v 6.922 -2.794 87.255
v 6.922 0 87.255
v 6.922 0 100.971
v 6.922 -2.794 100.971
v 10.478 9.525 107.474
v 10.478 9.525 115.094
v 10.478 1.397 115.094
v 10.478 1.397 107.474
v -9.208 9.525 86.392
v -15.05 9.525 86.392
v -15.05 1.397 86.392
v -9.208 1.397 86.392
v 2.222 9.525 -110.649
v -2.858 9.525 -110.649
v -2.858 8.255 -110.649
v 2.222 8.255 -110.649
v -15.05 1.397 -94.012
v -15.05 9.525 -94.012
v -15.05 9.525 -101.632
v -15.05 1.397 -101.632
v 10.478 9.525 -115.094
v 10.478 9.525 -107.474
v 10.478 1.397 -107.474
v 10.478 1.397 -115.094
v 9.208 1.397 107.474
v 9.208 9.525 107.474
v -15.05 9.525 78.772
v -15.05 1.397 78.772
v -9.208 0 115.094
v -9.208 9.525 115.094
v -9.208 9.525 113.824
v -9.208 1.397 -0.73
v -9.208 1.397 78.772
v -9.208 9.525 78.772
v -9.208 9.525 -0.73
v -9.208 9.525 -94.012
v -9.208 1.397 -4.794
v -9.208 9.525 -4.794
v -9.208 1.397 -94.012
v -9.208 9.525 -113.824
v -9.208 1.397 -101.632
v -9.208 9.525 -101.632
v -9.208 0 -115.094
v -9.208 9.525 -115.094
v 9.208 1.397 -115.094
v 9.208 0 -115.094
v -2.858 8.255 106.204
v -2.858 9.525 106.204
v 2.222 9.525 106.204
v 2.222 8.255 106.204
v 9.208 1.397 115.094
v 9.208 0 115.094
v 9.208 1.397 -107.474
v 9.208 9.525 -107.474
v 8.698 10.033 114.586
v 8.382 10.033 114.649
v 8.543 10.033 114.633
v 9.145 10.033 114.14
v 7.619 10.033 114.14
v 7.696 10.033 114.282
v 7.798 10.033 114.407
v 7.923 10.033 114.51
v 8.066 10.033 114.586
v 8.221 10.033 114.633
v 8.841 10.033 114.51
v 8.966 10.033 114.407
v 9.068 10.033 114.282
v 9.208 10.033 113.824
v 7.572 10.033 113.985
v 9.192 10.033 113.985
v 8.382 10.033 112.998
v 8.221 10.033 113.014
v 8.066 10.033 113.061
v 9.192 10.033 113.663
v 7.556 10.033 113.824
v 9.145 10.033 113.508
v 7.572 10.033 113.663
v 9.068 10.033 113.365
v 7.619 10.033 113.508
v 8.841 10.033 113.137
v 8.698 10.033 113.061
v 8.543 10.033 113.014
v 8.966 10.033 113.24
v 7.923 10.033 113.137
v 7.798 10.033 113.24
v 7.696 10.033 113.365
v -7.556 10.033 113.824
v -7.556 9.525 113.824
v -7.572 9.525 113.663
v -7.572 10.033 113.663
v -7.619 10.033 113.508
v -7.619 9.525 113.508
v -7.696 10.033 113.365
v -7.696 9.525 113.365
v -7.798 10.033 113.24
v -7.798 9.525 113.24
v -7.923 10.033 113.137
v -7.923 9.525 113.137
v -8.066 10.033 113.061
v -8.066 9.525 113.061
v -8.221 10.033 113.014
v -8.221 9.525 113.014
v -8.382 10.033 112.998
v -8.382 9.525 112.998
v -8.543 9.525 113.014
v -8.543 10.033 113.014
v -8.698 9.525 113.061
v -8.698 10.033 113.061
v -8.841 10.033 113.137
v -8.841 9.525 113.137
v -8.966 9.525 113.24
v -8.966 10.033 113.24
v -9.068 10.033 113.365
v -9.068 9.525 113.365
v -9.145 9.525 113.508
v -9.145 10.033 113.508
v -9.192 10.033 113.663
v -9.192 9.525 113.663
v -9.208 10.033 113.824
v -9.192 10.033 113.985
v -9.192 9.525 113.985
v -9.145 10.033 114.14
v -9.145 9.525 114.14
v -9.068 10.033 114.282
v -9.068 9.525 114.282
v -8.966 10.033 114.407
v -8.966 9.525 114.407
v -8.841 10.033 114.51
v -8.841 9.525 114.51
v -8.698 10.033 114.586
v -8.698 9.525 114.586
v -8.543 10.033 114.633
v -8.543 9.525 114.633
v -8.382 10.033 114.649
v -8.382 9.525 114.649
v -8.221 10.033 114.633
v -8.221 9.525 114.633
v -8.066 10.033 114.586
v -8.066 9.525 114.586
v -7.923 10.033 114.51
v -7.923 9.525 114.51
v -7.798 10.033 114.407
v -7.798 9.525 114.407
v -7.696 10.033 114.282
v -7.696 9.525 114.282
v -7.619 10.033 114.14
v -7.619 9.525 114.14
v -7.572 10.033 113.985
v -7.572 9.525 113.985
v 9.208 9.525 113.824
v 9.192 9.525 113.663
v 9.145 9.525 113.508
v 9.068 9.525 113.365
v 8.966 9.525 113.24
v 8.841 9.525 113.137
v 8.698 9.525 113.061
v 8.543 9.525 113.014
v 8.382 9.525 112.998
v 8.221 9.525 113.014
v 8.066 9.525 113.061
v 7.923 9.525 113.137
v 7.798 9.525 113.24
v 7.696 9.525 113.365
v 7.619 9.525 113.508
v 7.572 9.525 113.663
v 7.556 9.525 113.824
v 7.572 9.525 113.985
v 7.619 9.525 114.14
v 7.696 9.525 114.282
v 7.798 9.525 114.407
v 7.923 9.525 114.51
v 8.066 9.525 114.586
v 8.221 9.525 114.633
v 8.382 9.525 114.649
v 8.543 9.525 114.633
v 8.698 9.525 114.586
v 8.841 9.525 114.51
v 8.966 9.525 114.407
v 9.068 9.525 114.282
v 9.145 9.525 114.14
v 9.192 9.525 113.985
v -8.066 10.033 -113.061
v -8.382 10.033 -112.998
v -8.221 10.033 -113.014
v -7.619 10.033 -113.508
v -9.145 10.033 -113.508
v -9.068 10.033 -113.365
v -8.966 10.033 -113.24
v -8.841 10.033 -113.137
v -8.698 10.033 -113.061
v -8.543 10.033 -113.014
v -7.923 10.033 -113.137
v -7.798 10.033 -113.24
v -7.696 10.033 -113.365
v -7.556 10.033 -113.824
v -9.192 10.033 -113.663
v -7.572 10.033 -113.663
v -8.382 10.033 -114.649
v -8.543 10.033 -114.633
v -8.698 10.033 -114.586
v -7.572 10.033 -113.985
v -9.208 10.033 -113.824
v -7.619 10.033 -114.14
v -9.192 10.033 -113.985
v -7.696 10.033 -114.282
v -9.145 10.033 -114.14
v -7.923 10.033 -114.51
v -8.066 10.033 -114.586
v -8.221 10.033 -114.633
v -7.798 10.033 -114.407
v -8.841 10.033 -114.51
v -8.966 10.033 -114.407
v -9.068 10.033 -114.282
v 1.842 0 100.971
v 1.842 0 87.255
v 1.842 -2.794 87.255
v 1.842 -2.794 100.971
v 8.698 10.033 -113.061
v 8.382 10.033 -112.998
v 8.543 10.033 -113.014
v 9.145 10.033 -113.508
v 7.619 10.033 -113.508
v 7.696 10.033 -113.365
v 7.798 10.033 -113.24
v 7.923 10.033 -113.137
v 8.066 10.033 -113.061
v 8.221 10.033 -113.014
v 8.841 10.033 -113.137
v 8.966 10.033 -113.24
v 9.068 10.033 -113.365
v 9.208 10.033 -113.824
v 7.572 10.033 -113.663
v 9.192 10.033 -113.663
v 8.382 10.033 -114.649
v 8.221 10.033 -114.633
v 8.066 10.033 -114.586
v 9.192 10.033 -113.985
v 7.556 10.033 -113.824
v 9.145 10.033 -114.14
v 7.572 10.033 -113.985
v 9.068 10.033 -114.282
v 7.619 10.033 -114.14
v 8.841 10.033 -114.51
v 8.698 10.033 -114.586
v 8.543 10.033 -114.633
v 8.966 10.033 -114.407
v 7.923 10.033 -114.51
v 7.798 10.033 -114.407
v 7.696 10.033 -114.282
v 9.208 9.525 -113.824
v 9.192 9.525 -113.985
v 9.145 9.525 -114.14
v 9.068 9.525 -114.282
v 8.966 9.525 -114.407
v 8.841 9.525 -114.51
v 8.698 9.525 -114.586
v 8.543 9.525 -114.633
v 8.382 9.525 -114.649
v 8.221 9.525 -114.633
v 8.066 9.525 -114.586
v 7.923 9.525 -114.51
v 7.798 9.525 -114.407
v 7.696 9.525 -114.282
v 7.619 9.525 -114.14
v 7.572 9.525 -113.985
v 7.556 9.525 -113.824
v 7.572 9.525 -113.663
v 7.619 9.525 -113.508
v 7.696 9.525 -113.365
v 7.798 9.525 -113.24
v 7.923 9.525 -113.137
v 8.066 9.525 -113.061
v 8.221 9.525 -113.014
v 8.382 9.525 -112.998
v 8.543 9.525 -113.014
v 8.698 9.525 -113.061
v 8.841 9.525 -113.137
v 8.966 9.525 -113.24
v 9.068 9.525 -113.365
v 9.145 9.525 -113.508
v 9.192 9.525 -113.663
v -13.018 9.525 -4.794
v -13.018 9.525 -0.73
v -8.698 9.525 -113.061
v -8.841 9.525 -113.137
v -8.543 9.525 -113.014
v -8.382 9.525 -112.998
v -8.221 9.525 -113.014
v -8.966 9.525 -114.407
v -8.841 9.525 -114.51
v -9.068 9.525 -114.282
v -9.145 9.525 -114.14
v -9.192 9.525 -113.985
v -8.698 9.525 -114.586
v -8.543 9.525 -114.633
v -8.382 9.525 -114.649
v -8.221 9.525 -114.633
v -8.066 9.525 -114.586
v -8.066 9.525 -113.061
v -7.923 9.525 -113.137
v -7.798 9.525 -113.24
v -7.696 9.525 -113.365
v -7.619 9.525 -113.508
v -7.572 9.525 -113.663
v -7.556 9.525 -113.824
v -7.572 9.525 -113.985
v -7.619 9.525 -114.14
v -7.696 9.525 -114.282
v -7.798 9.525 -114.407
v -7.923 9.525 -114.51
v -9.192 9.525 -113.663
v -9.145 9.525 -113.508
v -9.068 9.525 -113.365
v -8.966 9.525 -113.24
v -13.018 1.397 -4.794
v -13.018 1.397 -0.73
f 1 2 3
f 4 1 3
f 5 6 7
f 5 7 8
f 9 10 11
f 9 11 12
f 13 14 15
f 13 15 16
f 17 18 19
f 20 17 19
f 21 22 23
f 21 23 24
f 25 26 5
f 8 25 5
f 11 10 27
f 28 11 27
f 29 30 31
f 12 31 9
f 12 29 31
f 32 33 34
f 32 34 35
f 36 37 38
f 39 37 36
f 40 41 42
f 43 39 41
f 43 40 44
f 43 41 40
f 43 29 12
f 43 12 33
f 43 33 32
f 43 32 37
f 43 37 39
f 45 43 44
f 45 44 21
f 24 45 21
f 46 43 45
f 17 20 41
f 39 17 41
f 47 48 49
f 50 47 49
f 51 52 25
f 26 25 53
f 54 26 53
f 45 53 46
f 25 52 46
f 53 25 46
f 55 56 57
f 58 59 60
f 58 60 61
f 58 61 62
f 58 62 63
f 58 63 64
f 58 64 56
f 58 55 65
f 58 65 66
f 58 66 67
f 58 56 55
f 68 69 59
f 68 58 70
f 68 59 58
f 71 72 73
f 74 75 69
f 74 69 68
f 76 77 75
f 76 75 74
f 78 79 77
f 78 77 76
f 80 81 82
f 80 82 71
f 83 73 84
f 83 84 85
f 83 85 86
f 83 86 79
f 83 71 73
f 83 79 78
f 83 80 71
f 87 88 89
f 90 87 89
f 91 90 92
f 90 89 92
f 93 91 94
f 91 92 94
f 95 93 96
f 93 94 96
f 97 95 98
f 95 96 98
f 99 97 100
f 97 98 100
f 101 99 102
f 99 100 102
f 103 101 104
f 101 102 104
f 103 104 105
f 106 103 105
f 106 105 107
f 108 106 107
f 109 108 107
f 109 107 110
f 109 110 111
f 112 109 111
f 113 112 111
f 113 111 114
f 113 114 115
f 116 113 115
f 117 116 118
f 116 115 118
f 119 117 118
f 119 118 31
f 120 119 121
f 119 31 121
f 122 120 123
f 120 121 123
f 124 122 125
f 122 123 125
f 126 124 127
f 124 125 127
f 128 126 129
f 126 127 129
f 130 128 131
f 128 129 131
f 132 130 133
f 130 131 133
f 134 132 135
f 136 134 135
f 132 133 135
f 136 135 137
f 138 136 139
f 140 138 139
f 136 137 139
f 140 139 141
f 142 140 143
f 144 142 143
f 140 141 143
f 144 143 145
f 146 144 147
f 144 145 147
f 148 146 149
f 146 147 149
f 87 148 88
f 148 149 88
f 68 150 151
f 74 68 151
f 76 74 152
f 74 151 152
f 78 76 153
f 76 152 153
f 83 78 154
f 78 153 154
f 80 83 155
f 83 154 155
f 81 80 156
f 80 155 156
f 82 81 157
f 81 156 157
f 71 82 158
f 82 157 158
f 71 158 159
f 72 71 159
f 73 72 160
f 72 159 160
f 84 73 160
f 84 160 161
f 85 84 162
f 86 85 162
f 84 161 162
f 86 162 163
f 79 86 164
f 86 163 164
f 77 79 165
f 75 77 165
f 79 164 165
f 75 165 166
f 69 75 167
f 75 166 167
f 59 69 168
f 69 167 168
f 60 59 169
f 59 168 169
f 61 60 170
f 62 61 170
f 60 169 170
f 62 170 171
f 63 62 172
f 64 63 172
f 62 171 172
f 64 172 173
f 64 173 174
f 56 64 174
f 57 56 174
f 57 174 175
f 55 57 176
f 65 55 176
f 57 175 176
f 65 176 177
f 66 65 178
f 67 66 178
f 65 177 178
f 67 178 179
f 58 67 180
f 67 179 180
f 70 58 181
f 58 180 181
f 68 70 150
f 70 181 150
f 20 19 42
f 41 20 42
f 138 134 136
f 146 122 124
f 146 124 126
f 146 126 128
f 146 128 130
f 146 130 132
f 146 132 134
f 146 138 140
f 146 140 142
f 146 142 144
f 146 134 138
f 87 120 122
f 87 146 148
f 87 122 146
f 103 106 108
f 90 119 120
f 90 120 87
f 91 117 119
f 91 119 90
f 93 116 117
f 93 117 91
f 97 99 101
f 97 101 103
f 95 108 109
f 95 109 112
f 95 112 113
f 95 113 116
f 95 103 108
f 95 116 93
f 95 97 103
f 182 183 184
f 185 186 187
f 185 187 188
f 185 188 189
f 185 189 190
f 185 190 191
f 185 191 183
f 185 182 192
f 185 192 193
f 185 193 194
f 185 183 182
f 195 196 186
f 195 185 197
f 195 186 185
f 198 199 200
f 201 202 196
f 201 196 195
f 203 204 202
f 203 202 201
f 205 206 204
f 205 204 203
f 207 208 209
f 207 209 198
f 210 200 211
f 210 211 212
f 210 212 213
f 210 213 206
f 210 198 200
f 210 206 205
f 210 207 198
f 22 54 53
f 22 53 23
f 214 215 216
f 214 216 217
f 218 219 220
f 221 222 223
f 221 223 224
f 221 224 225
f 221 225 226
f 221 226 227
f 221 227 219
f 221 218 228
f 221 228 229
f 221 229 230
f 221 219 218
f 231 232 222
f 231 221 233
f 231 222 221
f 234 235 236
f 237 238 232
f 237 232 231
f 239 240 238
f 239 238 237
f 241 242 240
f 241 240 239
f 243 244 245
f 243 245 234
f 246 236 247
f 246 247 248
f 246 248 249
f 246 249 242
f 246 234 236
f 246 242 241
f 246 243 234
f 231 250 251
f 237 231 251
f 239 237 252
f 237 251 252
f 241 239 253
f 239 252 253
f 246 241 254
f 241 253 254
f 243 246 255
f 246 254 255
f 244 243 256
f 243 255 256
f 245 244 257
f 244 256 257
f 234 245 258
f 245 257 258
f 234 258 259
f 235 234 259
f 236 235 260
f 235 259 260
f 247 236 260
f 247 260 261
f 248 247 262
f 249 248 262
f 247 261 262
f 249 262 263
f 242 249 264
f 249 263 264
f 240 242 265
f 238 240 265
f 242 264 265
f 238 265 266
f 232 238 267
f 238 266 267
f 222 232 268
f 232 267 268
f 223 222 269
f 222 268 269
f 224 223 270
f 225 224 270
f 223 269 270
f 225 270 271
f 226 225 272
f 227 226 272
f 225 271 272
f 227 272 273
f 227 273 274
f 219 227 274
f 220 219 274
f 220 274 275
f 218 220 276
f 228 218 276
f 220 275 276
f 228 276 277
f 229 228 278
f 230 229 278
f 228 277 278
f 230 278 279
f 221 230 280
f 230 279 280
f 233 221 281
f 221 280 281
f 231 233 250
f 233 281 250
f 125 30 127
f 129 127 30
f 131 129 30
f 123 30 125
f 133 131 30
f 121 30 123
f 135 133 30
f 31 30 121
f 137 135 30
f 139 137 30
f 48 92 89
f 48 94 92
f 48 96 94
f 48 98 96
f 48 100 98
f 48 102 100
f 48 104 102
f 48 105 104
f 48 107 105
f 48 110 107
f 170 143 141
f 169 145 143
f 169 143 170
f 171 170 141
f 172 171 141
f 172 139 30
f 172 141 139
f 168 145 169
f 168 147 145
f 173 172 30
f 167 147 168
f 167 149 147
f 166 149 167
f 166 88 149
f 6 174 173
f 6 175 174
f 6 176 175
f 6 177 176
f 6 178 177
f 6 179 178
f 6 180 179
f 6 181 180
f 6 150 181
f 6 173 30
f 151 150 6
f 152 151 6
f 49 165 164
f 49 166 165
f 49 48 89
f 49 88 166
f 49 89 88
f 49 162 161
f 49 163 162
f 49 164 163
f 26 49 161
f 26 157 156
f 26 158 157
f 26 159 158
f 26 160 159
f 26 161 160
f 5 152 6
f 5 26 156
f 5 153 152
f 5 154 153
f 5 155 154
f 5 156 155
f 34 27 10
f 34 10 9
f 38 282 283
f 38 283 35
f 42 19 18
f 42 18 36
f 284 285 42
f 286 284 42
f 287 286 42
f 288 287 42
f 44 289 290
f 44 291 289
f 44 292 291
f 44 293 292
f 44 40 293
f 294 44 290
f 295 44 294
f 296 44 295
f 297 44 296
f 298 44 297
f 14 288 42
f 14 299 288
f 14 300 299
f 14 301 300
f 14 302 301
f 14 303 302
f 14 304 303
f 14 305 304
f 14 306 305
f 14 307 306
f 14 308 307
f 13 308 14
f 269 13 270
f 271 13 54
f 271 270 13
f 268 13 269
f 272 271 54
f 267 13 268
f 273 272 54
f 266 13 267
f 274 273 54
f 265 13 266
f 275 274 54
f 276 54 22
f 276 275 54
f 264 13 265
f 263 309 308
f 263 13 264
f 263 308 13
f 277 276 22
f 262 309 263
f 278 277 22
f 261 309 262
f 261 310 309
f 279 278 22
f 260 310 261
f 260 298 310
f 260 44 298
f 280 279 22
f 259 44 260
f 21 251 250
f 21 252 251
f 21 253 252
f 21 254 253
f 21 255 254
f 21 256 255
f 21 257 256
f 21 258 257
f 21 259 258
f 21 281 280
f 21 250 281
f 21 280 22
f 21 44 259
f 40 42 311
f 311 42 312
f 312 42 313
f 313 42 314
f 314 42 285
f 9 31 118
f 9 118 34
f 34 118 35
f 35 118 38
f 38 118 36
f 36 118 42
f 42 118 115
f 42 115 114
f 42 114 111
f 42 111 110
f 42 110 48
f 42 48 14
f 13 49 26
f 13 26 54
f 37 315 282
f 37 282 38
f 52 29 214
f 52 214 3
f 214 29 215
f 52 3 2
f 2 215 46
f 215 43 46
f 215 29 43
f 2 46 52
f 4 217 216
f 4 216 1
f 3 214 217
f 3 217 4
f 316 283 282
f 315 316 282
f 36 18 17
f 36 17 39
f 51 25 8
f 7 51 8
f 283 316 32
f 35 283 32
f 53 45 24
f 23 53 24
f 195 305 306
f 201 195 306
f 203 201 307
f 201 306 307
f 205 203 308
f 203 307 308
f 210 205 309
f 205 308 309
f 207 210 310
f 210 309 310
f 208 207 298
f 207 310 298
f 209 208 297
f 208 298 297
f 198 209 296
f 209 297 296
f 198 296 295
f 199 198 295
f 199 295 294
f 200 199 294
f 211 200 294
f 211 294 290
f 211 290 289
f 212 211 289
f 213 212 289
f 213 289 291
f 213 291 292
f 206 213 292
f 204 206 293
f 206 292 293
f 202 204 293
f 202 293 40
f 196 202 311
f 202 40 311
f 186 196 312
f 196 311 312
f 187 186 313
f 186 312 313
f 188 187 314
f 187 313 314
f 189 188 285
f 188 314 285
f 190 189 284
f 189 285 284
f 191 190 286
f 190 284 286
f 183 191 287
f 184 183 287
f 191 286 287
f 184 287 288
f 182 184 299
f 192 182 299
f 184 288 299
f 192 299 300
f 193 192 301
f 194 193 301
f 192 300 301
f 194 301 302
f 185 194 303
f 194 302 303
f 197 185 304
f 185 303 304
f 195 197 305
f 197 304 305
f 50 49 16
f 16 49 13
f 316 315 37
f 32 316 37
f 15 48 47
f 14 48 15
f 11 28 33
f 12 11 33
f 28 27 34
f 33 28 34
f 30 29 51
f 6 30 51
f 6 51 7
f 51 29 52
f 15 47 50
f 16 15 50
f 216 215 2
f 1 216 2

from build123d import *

# Parameters (mm, degrees)
SKETCH1_W           = 18.415
SKETCH1_H           = 230.1875
BOSS_EXTRUDE1_DEPTH = 9.525
SKETCH2_W           = 5.08
SKETCH2_H           = 216.8525
CUT_EXTRUDE1_DEPTH  = 1.27
SKETCH3_W           = 5.842
SKETCH3_H           = 7.62
SKETCH3_W_2         = 3.81
SKETCH3_H_2         = 4.064
SKETCH3_W_3         = 1.27
BOSS_EXTRUDE2_DEPTH = 8.128
SKETCH4_R           = 0.8255
BOSS_EXTRUDE3_DEPTH = 0.508
SKETCH5_W           = 5.08
SKETCH5_H           = 13.716
BOSS_EXTRUDE4_DEPTH = 2.794


with BuildPart() as part:
    # Sketch1 → Boss-Extrude1 (new body)
    with BuildSketch(Plane(origin=(0, 0, 0), x_dir=(1, 0, 0), z_dir=(0, 1, 0))):
        Rectangle(SKETCH1_W, SKETCH1_H)
    extrude(amount=BOSS_EXTRUDE1_DEPTH)

    # Sketch2 → Cut-Extrude1 (cut)
    with BuildSketch(Plane(origin=(0, 9.525, 0), x_dir=(1, 0, 0), z_dir=(0, 1, 0))):
        with Locations((-0.3175, 2.2225)):
            Rectangle(SKETCH2_W, SKETCH2_H)
    extrude(amount=-CUT_EXTRUDE1_DEPTH, mode=Mode.SUBTRACT)

    # Sketch3 → Boss-Extrude2 (add)
    with BuildSketch(Plane(origin=(0, 9.525, 0), x_dir=(1, 0, 0), z_dir=(0, 1, 0))):
        with Locations((-12.1285, 97.82175)):
            Rectangle(SKETCH3_W, SKETCH3_H)
        with Locations((-11.1125, 2.76225)):
            Rectangle(SKETCH3_W_2, SKETCH3_H_2)
        with Locations((-12.1285, -82.58175)):
            Rectangle(SKETCH3_W, SKETCH3_H)
        with Locations((9.8425, 111.28375)):
            Rectangle(SKETCH3_W_3, SKETCH3_H)
        with Locations((9.8425, -111.28375)):
            Rectangle(SKETCH3_W_3, SKETCH3_H)
    extrude(amount=-BOSS_EXTRUDE2_DEPTH)

    # Sketch4 → Boss-Extrude3 (add)
    with BuildSketch(Plane(origin=(0, 9.525, 0), x_dir=(1, 0, 0), z_dir=(0, 1, 0))):
        with Locations((-8.382, 113.82375)):
            Circle(SKETCH4_R)
        with Locations((8.382, 113.82375)):
            Circle(SKETCH4_R)
        with Locations((8.382, -113.82375)):
            Circle(SKETCH4_R)
        with Locations((-8.382, -113.82375)):
            Circle(SKETCH4_R)
    extrude(amount=BOSS_EXTRUDE3_DEPTH)

    # Sketch5 → Boss-Extrude4 (add)
    with BuildSketch(Plane.XZ):
        with Locations((4.3815, 94.11335)):
            Rectangle(SKETCH5_W, SKETCH5_H)
    extrude(amount=BOSS_EXTRUDE4_DEPTH)


solid = part.part
